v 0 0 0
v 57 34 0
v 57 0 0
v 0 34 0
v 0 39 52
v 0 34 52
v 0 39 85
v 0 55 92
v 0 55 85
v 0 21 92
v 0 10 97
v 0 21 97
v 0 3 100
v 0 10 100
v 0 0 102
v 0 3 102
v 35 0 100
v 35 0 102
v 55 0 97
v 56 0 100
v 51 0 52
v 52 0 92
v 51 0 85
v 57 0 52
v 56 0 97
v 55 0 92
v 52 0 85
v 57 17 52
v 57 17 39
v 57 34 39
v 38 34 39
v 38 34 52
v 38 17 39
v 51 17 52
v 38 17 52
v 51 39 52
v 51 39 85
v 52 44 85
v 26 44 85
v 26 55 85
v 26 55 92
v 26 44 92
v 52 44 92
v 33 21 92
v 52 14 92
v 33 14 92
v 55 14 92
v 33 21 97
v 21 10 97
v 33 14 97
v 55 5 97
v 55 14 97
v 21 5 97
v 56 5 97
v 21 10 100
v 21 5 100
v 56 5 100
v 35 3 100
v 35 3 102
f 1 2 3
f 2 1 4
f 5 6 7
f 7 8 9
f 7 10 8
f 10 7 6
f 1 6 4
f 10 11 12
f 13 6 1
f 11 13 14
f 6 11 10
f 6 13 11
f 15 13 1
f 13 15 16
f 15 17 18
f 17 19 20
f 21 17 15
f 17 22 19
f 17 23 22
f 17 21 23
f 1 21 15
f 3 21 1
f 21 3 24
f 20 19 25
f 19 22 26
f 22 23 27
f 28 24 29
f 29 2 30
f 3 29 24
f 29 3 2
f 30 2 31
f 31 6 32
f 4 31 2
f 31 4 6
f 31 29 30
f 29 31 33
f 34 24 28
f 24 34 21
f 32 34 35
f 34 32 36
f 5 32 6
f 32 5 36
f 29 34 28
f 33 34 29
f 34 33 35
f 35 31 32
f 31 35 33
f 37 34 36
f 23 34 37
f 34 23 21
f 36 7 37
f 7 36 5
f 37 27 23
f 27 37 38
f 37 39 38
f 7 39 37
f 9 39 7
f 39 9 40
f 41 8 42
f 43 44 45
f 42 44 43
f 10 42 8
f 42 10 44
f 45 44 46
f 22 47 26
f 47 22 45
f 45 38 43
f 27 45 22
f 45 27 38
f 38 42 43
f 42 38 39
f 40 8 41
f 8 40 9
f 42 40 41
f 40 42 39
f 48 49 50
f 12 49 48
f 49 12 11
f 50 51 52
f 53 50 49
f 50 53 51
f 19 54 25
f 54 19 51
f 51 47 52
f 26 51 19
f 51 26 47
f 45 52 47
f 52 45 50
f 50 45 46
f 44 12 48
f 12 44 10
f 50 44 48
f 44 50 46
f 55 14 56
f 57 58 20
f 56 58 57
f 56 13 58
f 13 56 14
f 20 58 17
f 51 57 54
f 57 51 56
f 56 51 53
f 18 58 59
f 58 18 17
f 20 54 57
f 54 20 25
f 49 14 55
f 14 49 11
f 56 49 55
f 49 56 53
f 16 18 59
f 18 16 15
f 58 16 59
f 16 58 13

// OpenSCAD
translate([9.5, 8.5, 6.5]) color([0.15519843069219807, 0.9001623872580004, 0.552726485973739]) cube([19, 17, 13], center=true);
translate([28.5, 8.5, 6.5]) color([0.038601142410517486, 0.5855027152371853, 0.641549650670755]) cube([19, 17, 13], center=true);
translate([47.5, 8.5, 6.5]) color([0.0337956987021093, 0.7576919221586004, 0.817800141474185]) cube([19, 17, 13], center=true);
translate([9.5, 25.5, 6.5]) color([0.07164324218695617, 0.6483999400661788, 0.4565474809027662]) cube([19, 17, 13], center=true);
translate([28.5, 25.5, 6.5]) color([0.2387212873419211, 0.4586703816224843, 0.15938970975228217]) cube([19, 17, 13], center=true);
translate([47.5, 25.5, 6.5]) color([0.33366590673229635, 0.6552072997009475, 0.4764855561518734]) cube([19, 17, 13], center=true);
translate([9.5, 8.5, 19.5]) color([0.5559200946775417, 0.5434427938045303, 0.8205942401116392]) cube([19, 17, 13], center=true);
translate([28.5, 8.5, 19.5]) color([0.3433827981536126, 0.8129620907818157, 0.07998708713040747]) cube([19, 17, 13], center=true);
translate([47.5, 8.5, 19.5]) color([0.4277330458726053, 0.352320116536872, 0.451580638705249]) cube([19, 17, 13], center=true);
translate([9.5, 25.5, 19.5]) color([0.8335098205362665, 0.5123994004879511, 0.9872466462948367]) cube([19, 17, 13], center=true);
translate([28.5, 25.5, 19.5]) color([0.8614607202751068, 0.11884674531302208, 0.3168915355616677]) cube([19, 17, 13], center=true);
translate([47.5, 25.5, 19.5]) color([0.022725501526886682, 0.7337534213446073, 0.019200804366837798]) cube([19, 17, 13], center=true);
translate([9.5, 8.5, 32.5]) color([0.8859385148247924, 0.19334286484226215, 0.4138362902804684]) cube([19, 17, 13], center=true);
translate([28.5, 8.5, 32.5]) color([0.06203930600614804, 0.3112548872587563, 0.3895149894928328]) cube([19, 17, 13], center=true);
translate([47.5, 8.5, 32.5]) color([0.052230973545080106, 0.7675506531778632, 0.7113497195255859]) cube([19, 17, 13], center=true);
translate([9.5, 25.5, 32.5]) color([0.35788362412452357, 0.835192553154071, 0.07742180234362261]) cube([19, 17, 13], center=true);
translate([28.5, 25.5, 32.5]) color([0.05400640100767218, 0.35498029443727297, 0.9018413321683949]) cube([19, 17, 13], center=true);
translate([47.5, 25.5, 32.5]) color([0.7564677019106462, 0.6723176785539303, 0.5627357352457344]) cube([19, 17, 13], center=true);
translate([9.5, 8.5, 45.5]) color([0.80376553873448, 0.41222669318814775, 0.030688579780824843]) cube([19, 17, 13], center=true);
translate([28.5, 8.5, 45.5]) color([0.8024042864453003, 0.1904934342897321, 0.3876588498360868]) cube([19, 17, 13], center=true);
translate([47.5, 8.5, 45.5]) color([0.3576093472265096, 0.12336562593420342, 0.3507843689720118]) cube([19, 17, 13], center=true);
translate([9.5, 25.5, 45.5]) color([0.17708687785091481, 0.6160138300848896, 0.6534343577697814]) cube([19, 17, 13], center=true);
translate([28.5, 25.5, 45.5]) color([0.013646552881622753, 0.45647585236099164, 0.5540526564867162]) cube([19, 17, 13], center=true);
translate([8.5, 6.5, 57.5]) color([0.8716629944357835, 0.49603131023446156, 0.08045043690485232]) cube([17, 13, 11], center=true);
translate([25.5, 6.5, 57.5]) color([0.051723879096013836, 0.8621090829516437, 0.7907294093349121]) cube([17, 13, 11], center=true);
translate([42.5, 6.5, 57.5]) color([0.8584479311516113, 0.262242667584096, 0.6479973607947307]) cube([17, 13, 11], center=true);
translate([8.5, 19.5, 57.5]) color([0.09571804729550981, 0.8265731117136212, 0.33361293642632384]) cube([17, 13, 11], center=true);
translate([25.5, 19.5, 57.5]) color([0.9551472373193942, 0.4713825655590471, 0.0330676969459045]) cube([17, 13, 11], center=true);
translate([42.5, 19.5, 57.5]) color([0.909055877600589, 0.6255321488137767, 0.2870812860118641]) cube([17, 13, 11], center=true);
translate([8.5, 32.5, 57.5]) color([0.03680389375035842, 0.37668639673062454, 0.15686055976460878]) cube([17, 13, 11], center=true);
translate([25.5, 32.5, 57.5]) color([0.5482803113458813, 0.14688367516218315, 0.1746142788181122]) cube([17, 13, 11], center=true);
translate([42.5, 32.5, 57.5]) color([0.920869485728258, 0.6401200345146435, 0.24258141177262083]) cube([17, 13, 11], center=true);
translate([8.5, 6.5, 68.5]) color([0.8788962806324696, 0.6247158298512584, 0.9455993400800832]) cube([17, 13, 11], center=true);
translate([25.5, 6.5, 68.5]) color([0.4829167944087076, 0.8879008339780402, 0.678443807349386]) cube([17, 13, 11], center=true);
translate([42.5, 6.5, 68.5]) color([0.04416855593342761, 0.24029049005859915, 0.2815764049334011]) cube([17, 13, 11], center=true);
translate([8.5, 19.5, 68.5]) color([0.17001668338644926, 0.23818695062460127, 0.22604014846400422]) cube([17, 13, 11], center=true);
translate([25.5, 19.5, 68.5]) color([0.8783437492009086, 0.4628987935430291, 0.8765118313236592]) cube([17, 13, 11], center=true);
translate([42.5, 19.5, 68.5]) color([0.1379978834577653, 0.5649184865561083, 0.013467678145623552]) cube([17, 13, 11], center=true);
translate([8.5, 32.5, 68.5]) color([0.9303014098379871, 0.005637114397734955, 0.3899076485519639]) cube([17, 13, 11], center=true);
translate([25.5, 32.5, 68.5]) color([0.8015859586891702, 0.9998815592294843, 0.019509740361318695]) cube([17, 13, 11], center=true);
translate([42.5, 32.5, 68.5]) color([0.8240854838738103, 0.510087959495908, 0.038182020539084705]) cube([17, 13, 11], center=true);
translate([8.5, 6.5, 79.5]) color([0.7771192709025531, 0.11190241257102229, 0.6114741872824333]) cube([17, 13, 11], center=true);
translate([25.5, 6.5, 79.5]) color([0.7783252161231047, 0.6735909267280185, 0.3798743247069636]) cube([17, 13, 11], center=true);
translate([42.5, 6.5, 79.5]) color([0.026441636821160075, 0.43626396781238774, 0.9136944836857255]) cube([17, 13, 11], center=true);
translate([8.5, 19.5, 79.5]) color([0.33292336546782575, 0.24795871915323087, 0.13783083382268813]) cube([17, 13, 11], center=true);
translate([25.5, 19.5, 79.5]) color([0.5102524550010475, 0.5333482727437294, 0.07304824240354912]) cube([17, 13, 11], center=true);
translate([42.5, 19.5, 79.5]) color([0.40775848601839615, 0.6586814548864428, 0.9660506851714608]) cube([17, 13, 11], center=true);
translate([8.5, 32.5, 79.5]) color([0.43154112171906467, 0.4360353368941353, 0.47113397256850664]) cube([17, 13, 11], center=true);
translate([25.5, 32.5, 79.5]) color([0.2250334912265638, 0.3948376420144343, 0.6452647259919572]) cube([17, 13, 11], center=true);
translate([42.5, 32.5, 79.5]) color([0.39705920905186254, 0.5813757484333044, 0.8355822879997544]) cube([17, 13, 11], center=true);
translate([6.5, 5.5, 88.5]) color([0.997967573075557, 0.8850396836294676, 0.3717966269131009]) cube([13, 11, 7], center=true);
translate([19.5, 5.5, 88.5]) color([0.02172713431740758, 0.6116045995026433, 0.4745507082101075]) cube([13, 11, 7], center=true);
translate([32.5, 5.5, 88.5]) color([0.23701711204858011, 0.040304099105049285, 0.3215702389727013]) cube([13, 11, 7], center=true);
translate([45.5, 5.5, 88.5]) color([0.7980713128356309, 0.9641190068878396, 0.10666013907247773]) cube([13, 11, 7], center=true);
translate([6.5, 16.5, 88.5]) color([0.8776394117814497, 0.04871767121707815, 0.7134758188756509]) cube([13, 11, 7], center=true);
translate([19.5, 16.5, 88.5]) color([0.026795713363172546, 0.4210496822819296, 0.8702308384812625]) cube([13, 11, 7], center=true);
translate([32.5, 16.5, 88.5]) color([0.39310814762828206, 0.9245643176497426, 0.7131951411119577]) cube([13, 11, 7], center=true);
translate([45.5, 16.5, 88.5]) color([0.6041842807977467, 0.16137904800183167, 0.34049578364460964]) cube([13, 11, 7], center=true);
translate([6.5, 27.5, 88.5]) color([0.4110961642787554, 0.5902048641324954, 0.9960381602092927]) cube([13, 11, 7], center=true);
translate([19.5, 27.5, 88.5]) color([0.2837097478049315, 0.5035628908314976, 0.9334479076287334]) cube([13, 11, 7], center=true);
translate([32.5, 27.5, 88.5]) color([0.3454207937620084, 0.6286047872723735, 0.7661315386941904]) cube([13, 11, 7], center=true);
translate([45.5, 27.5, 88.5]) color([0.6302697250151431, 0.7534306798421236, 0.19569300023569658]) cube([13, 11, 7], center=true);
translate([6.5, 38.5, 88.5]) color([0.9573376868488813, 0.17689780684900636, 0.583681176041597]) cube([13, 11, 7], center=true);
translate([19.5, 38.5, 88.5]) color([0.2960426090666165, 0.6344230252613314, 0.2911104153948655]) cube([13, 11, 7], center=true);
translate([32.5, 38.5, 88.5]) color([0.4312133568145403, 0.6822225482057551, 0.2690687505540429]) cube([13, 11, 7], center=true);
translate([45.5, 38.5, 88.5]) color([0.7278758824480682, 0.346877672777792, 0.1321560972206215]) cube([13, 11, 7], center=true);
translate([6.5, 49.5, 88.5]) color([0.613128716923026, 0.1657580288590924, 0.4305774463467016]) cube([13, 11, 7], center=true);
translate([19.5, 49.5, 88.5]) color([0.398397411879296, 0.07616884739618512, 0.7107698374020727]) cube([13, 11, 7], center=true);
translate([5.5, 3.5, 94.5]) color([0.6808235651092605, 0.7777950050341181, 0.5449131408796454]) cube([11, 7, 5], center=true);
translate([16.5, 3.5, 94.5]) color([0.5539167757205721, 0.1692330029082909, 0.2074638989900912]) cube([11, 7, 5], center=true);
translate([27.5, 3.5, 94.5]) color([0.22824949048252774, 0.5253035287227936, 0.8189825824874795]) cube([11, 7, 5], center=true);
translate([38.5, 3.5, 94.5]) color([0.3569741167117525, 0.881871988053252, 0.7358782685401997]) cube([11, 7, 5], center=true);
translate([49.5, 3.5, 94.5]) color([0.7164471432061884, 0.335172129304652, 0.11847749205352176]) cube([11, 7, 5], center=true);
translate([5.5, 10.5, 94.5]) color([0.962790481106405, 0.8546106356240183, 0.4088679907725796]) cube([11, 7, 5], center=true);
translate([16.5, 10.5, 94.5]) color([0.863218190236155, 0.8992171150320745, 0.34247362336498666]) cube([11, 7, 5], center=true);
translate([27.5, 10.5, 94.5]) color([0.5015614924470504, 0.331789840259637, 0.6951575140996313]) cube([11, 7, 5], center=true);
translate([38.5, 10.5, 94.5]) color([0.9121673135171753, 0.9845441038891614, 0.743779074814013]) cube([11, 7, 5], center=true);
translate([49.5, 10.5, 94.5]) color([0.30524235393506627, 0.8804932900877588, 0.9926196290445818]) cube([11, 7, 5], center=true);
translate([5.5, 17.5, 94.5]) color([0.3465261637439211, 0.9487123524492477, 0.5115464054506906]) cube([11, 7, 5], center=true);
translate([16.5, 17.5, 94.5]) color([0.9646354422725825, 0.9958559900991514, 0.8129420958288965]) cube([11, 7, 5], center=true);
translate([27.5, 17.5, 94.5]) color([0.683437049189351, 0.15401446929310414, 0.004917283233195846]) cube([11, 7, 5], center=true);
translate([3.5, 2.5, 98.5]) color([0.595470850423361, 0.7044599054830536, 0.9355380451790102]) cube([7, 5, 3], center=true);
translate([10.5, 2.5, 98.5]) color([0.5171199001879537, 0.6968466027027539, 0.6473559714710018]) cube([7, 5, 3], center=true);
translate([17.5, 2.5, 98.5]) color([0.2049201249762317, 0.6443000927800802, 0.9817212113250201]) cube([7, 5, 3], center=true);
translate([24.5, 2.5, 98.5]) color([0.11118495663016492, 0.6885432431989881, 0.6143051174926554]) cube([7, 5, 3], center=true);
translate([31.5, 2.5, 98.5]) color([0.3758547237916068, 0.7933477538527628, 0.01048585858492923]) cube([7, 5, 3], center=true);
translate([38.5, 2.5, 98.5]) color([0.8924116221231707, 0.8173639530127002, 0.4807048314687138]) cube([7, 5, 3], center=true);
translate([45.5, 2.5, 98.5]) color([0.10813915488104964, 0.45262855566363425, 0.584252899115387]) cube([7, 5, 3], center=true);
translate([52.5, 2.5, 98.5]) color([0.25388347854124227, 0.48653146484559573, 0.7757287638538752]) cube([7, 5, 3], center=true);
translate([3.5, 7.5, 98.5]) color([0.9227317956018974, 0.5616450276347316, 0.8272417850395823]) cube([7, 5, 3], center=true);
translate([10.5, 7.5, 98.5]) color([0.07793321296960098, 0.8563680463134653, 0.9208145654644209]) cube([7, 5, 3], center=true);
translate([17.5, 7.5, 98.5]) color([0.16800137628452116, 0.8274873617530726, 0.8495661703259881]) cube([7, 5, 3], center=true);
translate([2.5, 1.5, 101.0]) color([0.8786588683257629, 0.5171395198173923, 0.6082542438853435]) cube([5, 3, 2], center=true);
translate([7.5, 1.5, 101.0]) color([0.20808324544269907, 0.7081315493857046, 0.4050173034081427]) cube([5, 3, 2], center=true);
translate([12.5, 1.5, 101.0]) color([0.021169085707055446, 0.13426711350425513, 0.3882180316100641]) cube([5, 3, 2], center=true);
translate([17.5, 1.5, 101.0]) color([0.885179806060811, 0.5649422932688362, 0.916257034056247]) cube([5, 3, 2], center=true);
translate([22.5, 1.5, 101.0]) color([0.9294838443573096, 0.08679499211949981, 0.5882154137282689]) cube([5, 3, 2], center=true);
translate([27.5, 1.5, 101.0]) color([0.33452803815227405, 0.5067951222763686, 0.4555248024993094]) cube([5, 3, 2], center=true);
translate([32.5, 1.5, 101.0]) color([0.4799432726204613, 0.10180580816188334, 0.8331600837968306]) cube([5, 3, 2], center=true);
